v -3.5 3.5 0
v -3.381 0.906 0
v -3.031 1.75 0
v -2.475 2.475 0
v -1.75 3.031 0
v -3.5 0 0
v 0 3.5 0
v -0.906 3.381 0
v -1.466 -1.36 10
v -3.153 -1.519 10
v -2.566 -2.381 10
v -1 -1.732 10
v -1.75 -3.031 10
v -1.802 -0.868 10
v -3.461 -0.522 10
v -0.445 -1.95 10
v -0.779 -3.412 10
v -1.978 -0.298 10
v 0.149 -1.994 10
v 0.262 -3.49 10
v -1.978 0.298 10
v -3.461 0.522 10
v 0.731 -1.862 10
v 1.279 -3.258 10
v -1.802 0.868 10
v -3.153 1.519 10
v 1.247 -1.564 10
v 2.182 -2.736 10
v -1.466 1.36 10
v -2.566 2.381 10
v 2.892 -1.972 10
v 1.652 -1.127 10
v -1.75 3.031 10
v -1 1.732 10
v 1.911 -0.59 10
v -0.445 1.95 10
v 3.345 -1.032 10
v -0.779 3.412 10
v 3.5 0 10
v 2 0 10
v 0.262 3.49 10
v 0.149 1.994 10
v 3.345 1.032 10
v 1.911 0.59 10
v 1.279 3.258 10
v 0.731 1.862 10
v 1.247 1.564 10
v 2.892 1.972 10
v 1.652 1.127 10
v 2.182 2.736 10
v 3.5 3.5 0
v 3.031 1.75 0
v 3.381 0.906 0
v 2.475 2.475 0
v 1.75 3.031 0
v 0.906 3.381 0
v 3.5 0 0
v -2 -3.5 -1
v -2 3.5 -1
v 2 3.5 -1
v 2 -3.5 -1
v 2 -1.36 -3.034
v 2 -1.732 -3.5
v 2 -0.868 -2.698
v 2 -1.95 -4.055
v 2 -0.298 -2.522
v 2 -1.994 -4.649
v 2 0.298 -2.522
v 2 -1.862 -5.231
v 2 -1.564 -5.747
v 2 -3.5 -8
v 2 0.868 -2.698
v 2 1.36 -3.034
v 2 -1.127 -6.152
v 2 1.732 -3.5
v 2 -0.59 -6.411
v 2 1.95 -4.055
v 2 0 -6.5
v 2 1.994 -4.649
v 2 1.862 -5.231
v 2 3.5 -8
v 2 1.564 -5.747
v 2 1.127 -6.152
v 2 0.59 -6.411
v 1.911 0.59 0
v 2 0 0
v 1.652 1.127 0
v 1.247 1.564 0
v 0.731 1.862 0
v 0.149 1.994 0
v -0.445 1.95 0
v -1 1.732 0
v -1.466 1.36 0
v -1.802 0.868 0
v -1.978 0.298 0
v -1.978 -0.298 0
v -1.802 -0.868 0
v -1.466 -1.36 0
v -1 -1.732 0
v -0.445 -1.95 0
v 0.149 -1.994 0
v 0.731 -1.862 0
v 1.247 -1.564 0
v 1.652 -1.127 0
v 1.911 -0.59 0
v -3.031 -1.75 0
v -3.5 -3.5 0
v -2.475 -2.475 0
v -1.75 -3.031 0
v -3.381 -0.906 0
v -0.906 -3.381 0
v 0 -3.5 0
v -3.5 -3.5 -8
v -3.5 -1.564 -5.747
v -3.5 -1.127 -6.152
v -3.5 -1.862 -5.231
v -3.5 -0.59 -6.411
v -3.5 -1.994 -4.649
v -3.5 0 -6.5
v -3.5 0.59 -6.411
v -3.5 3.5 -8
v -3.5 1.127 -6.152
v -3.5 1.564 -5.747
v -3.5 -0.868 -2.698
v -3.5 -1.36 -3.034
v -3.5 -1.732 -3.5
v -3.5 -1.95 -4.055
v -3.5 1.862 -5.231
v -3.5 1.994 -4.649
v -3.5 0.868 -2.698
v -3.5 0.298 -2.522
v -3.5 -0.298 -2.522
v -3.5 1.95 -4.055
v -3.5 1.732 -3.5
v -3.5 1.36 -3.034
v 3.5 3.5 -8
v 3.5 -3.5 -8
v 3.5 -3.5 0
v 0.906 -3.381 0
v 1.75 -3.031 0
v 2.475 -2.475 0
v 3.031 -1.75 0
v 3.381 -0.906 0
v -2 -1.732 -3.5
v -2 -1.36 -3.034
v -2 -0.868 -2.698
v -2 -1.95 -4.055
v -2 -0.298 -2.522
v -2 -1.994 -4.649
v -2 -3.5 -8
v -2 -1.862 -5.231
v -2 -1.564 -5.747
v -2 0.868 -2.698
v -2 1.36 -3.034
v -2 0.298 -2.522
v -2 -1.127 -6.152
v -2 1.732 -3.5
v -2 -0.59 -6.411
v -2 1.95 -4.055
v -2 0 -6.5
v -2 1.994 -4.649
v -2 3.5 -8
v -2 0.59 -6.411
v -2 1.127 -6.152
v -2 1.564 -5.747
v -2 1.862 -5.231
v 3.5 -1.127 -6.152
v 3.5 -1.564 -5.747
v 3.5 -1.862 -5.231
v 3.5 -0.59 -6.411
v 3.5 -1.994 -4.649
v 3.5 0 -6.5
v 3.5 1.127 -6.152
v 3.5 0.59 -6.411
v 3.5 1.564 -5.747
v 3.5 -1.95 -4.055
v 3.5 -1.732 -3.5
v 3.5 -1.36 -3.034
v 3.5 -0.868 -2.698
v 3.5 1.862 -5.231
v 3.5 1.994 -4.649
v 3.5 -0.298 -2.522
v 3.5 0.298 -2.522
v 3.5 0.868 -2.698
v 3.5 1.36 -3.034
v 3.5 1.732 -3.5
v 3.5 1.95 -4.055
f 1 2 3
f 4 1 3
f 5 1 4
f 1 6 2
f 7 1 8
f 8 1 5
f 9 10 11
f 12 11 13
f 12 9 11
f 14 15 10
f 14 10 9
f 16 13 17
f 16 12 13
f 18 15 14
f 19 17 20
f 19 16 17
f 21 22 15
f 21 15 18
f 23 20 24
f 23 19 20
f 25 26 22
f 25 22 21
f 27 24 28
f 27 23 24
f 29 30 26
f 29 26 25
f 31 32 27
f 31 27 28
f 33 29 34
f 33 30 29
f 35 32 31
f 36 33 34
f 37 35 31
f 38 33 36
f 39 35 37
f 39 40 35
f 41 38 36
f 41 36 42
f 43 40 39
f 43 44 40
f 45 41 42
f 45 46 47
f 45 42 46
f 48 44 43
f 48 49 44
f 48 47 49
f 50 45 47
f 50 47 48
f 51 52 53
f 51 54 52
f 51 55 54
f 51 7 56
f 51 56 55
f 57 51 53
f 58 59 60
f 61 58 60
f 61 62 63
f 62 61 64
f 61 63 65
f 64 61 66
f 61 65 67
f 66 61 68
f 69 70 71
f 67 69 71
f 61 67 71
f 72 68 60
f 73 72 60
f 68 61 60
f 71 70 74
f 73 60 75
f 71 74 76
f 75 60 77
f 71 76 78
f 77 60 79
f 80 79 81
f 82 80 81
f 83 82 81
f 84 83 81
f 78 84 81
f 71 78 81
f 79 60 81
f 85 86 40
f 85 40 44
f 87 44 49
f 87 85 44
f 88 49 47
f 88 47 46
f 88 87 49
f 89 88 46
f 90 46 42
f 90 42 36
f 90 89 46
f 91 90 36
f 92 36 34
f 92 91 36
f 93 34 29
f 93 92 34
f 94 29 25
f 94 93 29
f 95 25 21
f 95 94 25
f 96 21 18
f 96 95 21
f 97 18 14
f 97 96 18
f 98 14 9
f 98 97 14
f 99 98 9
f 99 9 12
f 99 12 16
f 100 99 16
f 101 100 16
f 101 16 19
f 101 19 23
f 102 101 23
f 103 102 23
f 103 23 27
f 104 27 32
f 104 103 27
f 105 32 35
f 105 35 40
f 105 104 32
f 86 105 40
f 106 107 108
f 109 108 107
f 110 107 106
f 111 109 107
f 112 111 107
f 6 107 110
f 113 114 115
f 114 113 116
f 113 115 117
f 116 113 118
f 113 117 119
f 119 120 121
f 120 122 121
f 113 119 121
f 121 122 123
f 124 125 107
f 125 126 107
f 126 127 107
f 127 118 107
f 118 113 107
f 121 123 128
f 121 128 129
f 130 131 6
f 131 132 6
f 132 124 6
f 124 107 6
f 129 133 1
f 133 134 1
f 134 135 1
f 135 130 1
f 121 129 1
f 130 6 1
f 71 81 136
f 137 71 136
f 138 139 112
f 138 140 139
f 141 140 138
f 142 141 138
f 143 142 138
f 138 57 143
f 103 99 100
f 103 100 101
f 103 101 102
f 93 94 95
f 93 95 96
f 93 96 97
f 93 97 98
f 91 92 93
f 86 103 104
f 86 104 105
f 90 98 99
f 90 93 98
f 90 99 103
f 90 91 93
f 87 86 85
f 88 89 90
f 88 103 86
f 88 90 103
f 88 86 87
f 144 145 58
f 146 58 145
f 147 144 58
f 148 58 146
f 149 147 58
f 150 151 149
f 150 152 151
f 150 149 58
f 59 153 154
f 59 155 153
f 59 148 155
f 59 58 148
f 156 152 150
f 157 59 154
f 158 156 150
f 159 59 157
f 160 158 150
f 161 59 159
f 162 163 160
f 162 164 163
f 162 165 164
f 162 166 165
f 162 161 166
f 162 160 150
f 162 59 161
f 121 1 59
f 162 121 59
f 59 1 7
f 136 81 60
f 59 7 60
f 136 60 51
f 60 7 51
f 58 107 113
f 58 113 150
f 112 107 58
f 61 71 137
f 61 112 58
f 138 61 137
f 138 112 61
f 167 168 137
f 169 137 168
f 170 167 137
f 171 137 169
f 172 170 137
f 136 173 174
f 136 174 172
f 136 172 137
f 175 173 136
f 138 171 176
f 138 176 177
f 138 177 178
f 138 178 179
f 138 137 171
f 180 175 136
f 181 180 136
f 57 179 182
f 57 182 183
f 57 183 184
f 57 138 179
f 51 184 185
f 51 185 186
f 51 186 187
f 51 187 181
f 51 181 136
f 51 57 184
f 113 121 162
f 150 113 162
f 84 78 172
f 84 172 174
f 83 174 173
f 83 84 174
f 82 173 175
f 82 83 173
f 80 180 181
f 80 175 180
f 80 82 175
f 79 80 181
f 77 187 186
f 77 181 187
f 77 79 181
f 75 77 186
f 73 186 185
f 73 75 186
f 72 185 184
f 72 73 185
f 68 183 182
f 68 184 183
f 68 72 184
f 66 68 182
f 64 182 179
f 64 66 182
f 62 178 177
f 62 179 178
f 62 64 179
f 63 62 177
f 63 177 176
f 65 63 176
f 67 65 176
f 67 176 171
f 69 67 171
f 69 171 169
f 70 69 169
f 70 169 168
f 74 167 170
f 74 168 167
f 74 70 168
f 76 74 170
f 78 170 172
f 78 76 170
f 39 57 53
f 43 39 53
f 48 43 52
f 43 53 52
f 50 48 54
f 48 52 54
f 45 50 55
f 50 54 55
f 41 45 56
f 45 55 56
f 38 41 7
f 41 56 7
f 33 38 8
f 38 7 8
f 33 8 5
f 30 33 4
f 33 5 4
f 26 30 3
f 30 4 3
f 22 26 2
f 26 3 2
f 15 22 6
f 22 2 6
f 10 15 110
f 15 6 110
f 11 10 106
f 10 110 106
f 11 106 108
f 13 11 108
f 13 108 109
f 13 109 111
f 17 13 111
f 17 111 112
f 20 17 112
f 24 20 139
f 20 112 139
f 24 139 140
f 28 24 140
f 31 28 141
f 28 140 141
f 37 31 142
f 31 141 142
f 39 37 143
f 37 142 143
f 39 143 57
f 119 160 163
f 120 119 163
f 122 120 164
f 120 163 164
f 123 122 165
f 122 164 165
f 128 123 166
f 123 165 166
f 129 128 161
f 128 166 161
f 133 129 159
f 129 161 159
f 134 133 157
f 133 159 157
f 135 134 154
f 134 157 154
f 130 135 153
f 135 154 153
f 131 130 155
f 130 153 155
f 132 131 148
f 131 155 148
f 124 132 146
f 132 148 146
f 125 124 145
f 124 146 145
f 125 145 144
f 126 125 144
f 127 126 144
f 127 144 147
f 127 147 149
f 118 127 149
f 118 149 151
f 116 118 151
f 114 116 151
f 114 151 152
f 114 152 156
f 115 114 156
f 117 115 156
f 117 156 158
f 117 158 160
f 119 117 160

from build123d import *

# Parameters (mm, degrees)
SKETCH1_R               = 3.5
SKETCH1_R_2             = 2
BOSS_EXTRUDE1_DEPTH     = 10
SKETCH2_W               = 7
SKETCH2_H               = 7
BOSS_EXTRUDE2_DEPTH     = 8
SKETCH3_W               = 4
SKETCH3_H               = 10
CUT_EXTRUDE1_DEPTH      = 4.5
CUT_EXTRUDE1_DEPTH_BACK = 4.5
SKETCH4_R               = 2
CUT_EXTRUDE2_DEPTH      = 4.5
CUT_EXTRUDE2_DEPTH_BACK = 4.5


with BuildPart() as part:
    # Sketch1 → Boss-Extrude1 (new body)
    with BuildSketch(Plane.XY):
        Circle(SKETCH1_R)
        Circle(SKETCH1_R_2, mode=Mode.SUBTRACT)
    extrude(amount=BOSS_EXTRUDE1_DEPTH)

    # Sketch2 → Boss-Extrude2 (add)
    with BuildSketch(Plane.XY):
        Rectangle(SKETCH2_W, SKETCH2_H)
    extrude(amount=-BOSS_EXTRUDE2_DEPTH)

    # Sketch3 → Cut-Extrude1 (cut, two sides)
    with BuildSketch(Plane(origin=(0, 0, 0), x_dir=(1, 0, 0), z_dir=(0, 1, 0))) as cut_extrude1_sk:
        with Locations((0, 6)):
            Rectangle(SKETCH3_W, SKETCH3_H)
    extrude(amount=CUT_EXTRUDE1_DEPTH, mode=Mode.SUBTRACT)
    extrude(cut_extrude1_sk.sketch, amount=-CUT_EXTRUDE1_DEPTH_BACK, mode=Mode.SUBTRACT)

    # Sketch4 → Cut-Extrude2 (cut, two sides)
    with BuildSketch(Plane(origin=(0, 0, 0), x_dir=(0, 0, -1), z_dir=(1, 0, 0))) as cut_extrude2_sk:
        with Locations((4.5, 0)):
            Circle(SKETCH4_R)
    extrude(amount=CUT_EXTRUDE2_DEPTH, mode=Mode.SUBTRACT)
    extrude(cut_extrude2_sk.sketch, amount=-CUT_EXTRUDE2_DEPTH_BACK, mode=Mode.SUBTRACT)


solid = part.part
